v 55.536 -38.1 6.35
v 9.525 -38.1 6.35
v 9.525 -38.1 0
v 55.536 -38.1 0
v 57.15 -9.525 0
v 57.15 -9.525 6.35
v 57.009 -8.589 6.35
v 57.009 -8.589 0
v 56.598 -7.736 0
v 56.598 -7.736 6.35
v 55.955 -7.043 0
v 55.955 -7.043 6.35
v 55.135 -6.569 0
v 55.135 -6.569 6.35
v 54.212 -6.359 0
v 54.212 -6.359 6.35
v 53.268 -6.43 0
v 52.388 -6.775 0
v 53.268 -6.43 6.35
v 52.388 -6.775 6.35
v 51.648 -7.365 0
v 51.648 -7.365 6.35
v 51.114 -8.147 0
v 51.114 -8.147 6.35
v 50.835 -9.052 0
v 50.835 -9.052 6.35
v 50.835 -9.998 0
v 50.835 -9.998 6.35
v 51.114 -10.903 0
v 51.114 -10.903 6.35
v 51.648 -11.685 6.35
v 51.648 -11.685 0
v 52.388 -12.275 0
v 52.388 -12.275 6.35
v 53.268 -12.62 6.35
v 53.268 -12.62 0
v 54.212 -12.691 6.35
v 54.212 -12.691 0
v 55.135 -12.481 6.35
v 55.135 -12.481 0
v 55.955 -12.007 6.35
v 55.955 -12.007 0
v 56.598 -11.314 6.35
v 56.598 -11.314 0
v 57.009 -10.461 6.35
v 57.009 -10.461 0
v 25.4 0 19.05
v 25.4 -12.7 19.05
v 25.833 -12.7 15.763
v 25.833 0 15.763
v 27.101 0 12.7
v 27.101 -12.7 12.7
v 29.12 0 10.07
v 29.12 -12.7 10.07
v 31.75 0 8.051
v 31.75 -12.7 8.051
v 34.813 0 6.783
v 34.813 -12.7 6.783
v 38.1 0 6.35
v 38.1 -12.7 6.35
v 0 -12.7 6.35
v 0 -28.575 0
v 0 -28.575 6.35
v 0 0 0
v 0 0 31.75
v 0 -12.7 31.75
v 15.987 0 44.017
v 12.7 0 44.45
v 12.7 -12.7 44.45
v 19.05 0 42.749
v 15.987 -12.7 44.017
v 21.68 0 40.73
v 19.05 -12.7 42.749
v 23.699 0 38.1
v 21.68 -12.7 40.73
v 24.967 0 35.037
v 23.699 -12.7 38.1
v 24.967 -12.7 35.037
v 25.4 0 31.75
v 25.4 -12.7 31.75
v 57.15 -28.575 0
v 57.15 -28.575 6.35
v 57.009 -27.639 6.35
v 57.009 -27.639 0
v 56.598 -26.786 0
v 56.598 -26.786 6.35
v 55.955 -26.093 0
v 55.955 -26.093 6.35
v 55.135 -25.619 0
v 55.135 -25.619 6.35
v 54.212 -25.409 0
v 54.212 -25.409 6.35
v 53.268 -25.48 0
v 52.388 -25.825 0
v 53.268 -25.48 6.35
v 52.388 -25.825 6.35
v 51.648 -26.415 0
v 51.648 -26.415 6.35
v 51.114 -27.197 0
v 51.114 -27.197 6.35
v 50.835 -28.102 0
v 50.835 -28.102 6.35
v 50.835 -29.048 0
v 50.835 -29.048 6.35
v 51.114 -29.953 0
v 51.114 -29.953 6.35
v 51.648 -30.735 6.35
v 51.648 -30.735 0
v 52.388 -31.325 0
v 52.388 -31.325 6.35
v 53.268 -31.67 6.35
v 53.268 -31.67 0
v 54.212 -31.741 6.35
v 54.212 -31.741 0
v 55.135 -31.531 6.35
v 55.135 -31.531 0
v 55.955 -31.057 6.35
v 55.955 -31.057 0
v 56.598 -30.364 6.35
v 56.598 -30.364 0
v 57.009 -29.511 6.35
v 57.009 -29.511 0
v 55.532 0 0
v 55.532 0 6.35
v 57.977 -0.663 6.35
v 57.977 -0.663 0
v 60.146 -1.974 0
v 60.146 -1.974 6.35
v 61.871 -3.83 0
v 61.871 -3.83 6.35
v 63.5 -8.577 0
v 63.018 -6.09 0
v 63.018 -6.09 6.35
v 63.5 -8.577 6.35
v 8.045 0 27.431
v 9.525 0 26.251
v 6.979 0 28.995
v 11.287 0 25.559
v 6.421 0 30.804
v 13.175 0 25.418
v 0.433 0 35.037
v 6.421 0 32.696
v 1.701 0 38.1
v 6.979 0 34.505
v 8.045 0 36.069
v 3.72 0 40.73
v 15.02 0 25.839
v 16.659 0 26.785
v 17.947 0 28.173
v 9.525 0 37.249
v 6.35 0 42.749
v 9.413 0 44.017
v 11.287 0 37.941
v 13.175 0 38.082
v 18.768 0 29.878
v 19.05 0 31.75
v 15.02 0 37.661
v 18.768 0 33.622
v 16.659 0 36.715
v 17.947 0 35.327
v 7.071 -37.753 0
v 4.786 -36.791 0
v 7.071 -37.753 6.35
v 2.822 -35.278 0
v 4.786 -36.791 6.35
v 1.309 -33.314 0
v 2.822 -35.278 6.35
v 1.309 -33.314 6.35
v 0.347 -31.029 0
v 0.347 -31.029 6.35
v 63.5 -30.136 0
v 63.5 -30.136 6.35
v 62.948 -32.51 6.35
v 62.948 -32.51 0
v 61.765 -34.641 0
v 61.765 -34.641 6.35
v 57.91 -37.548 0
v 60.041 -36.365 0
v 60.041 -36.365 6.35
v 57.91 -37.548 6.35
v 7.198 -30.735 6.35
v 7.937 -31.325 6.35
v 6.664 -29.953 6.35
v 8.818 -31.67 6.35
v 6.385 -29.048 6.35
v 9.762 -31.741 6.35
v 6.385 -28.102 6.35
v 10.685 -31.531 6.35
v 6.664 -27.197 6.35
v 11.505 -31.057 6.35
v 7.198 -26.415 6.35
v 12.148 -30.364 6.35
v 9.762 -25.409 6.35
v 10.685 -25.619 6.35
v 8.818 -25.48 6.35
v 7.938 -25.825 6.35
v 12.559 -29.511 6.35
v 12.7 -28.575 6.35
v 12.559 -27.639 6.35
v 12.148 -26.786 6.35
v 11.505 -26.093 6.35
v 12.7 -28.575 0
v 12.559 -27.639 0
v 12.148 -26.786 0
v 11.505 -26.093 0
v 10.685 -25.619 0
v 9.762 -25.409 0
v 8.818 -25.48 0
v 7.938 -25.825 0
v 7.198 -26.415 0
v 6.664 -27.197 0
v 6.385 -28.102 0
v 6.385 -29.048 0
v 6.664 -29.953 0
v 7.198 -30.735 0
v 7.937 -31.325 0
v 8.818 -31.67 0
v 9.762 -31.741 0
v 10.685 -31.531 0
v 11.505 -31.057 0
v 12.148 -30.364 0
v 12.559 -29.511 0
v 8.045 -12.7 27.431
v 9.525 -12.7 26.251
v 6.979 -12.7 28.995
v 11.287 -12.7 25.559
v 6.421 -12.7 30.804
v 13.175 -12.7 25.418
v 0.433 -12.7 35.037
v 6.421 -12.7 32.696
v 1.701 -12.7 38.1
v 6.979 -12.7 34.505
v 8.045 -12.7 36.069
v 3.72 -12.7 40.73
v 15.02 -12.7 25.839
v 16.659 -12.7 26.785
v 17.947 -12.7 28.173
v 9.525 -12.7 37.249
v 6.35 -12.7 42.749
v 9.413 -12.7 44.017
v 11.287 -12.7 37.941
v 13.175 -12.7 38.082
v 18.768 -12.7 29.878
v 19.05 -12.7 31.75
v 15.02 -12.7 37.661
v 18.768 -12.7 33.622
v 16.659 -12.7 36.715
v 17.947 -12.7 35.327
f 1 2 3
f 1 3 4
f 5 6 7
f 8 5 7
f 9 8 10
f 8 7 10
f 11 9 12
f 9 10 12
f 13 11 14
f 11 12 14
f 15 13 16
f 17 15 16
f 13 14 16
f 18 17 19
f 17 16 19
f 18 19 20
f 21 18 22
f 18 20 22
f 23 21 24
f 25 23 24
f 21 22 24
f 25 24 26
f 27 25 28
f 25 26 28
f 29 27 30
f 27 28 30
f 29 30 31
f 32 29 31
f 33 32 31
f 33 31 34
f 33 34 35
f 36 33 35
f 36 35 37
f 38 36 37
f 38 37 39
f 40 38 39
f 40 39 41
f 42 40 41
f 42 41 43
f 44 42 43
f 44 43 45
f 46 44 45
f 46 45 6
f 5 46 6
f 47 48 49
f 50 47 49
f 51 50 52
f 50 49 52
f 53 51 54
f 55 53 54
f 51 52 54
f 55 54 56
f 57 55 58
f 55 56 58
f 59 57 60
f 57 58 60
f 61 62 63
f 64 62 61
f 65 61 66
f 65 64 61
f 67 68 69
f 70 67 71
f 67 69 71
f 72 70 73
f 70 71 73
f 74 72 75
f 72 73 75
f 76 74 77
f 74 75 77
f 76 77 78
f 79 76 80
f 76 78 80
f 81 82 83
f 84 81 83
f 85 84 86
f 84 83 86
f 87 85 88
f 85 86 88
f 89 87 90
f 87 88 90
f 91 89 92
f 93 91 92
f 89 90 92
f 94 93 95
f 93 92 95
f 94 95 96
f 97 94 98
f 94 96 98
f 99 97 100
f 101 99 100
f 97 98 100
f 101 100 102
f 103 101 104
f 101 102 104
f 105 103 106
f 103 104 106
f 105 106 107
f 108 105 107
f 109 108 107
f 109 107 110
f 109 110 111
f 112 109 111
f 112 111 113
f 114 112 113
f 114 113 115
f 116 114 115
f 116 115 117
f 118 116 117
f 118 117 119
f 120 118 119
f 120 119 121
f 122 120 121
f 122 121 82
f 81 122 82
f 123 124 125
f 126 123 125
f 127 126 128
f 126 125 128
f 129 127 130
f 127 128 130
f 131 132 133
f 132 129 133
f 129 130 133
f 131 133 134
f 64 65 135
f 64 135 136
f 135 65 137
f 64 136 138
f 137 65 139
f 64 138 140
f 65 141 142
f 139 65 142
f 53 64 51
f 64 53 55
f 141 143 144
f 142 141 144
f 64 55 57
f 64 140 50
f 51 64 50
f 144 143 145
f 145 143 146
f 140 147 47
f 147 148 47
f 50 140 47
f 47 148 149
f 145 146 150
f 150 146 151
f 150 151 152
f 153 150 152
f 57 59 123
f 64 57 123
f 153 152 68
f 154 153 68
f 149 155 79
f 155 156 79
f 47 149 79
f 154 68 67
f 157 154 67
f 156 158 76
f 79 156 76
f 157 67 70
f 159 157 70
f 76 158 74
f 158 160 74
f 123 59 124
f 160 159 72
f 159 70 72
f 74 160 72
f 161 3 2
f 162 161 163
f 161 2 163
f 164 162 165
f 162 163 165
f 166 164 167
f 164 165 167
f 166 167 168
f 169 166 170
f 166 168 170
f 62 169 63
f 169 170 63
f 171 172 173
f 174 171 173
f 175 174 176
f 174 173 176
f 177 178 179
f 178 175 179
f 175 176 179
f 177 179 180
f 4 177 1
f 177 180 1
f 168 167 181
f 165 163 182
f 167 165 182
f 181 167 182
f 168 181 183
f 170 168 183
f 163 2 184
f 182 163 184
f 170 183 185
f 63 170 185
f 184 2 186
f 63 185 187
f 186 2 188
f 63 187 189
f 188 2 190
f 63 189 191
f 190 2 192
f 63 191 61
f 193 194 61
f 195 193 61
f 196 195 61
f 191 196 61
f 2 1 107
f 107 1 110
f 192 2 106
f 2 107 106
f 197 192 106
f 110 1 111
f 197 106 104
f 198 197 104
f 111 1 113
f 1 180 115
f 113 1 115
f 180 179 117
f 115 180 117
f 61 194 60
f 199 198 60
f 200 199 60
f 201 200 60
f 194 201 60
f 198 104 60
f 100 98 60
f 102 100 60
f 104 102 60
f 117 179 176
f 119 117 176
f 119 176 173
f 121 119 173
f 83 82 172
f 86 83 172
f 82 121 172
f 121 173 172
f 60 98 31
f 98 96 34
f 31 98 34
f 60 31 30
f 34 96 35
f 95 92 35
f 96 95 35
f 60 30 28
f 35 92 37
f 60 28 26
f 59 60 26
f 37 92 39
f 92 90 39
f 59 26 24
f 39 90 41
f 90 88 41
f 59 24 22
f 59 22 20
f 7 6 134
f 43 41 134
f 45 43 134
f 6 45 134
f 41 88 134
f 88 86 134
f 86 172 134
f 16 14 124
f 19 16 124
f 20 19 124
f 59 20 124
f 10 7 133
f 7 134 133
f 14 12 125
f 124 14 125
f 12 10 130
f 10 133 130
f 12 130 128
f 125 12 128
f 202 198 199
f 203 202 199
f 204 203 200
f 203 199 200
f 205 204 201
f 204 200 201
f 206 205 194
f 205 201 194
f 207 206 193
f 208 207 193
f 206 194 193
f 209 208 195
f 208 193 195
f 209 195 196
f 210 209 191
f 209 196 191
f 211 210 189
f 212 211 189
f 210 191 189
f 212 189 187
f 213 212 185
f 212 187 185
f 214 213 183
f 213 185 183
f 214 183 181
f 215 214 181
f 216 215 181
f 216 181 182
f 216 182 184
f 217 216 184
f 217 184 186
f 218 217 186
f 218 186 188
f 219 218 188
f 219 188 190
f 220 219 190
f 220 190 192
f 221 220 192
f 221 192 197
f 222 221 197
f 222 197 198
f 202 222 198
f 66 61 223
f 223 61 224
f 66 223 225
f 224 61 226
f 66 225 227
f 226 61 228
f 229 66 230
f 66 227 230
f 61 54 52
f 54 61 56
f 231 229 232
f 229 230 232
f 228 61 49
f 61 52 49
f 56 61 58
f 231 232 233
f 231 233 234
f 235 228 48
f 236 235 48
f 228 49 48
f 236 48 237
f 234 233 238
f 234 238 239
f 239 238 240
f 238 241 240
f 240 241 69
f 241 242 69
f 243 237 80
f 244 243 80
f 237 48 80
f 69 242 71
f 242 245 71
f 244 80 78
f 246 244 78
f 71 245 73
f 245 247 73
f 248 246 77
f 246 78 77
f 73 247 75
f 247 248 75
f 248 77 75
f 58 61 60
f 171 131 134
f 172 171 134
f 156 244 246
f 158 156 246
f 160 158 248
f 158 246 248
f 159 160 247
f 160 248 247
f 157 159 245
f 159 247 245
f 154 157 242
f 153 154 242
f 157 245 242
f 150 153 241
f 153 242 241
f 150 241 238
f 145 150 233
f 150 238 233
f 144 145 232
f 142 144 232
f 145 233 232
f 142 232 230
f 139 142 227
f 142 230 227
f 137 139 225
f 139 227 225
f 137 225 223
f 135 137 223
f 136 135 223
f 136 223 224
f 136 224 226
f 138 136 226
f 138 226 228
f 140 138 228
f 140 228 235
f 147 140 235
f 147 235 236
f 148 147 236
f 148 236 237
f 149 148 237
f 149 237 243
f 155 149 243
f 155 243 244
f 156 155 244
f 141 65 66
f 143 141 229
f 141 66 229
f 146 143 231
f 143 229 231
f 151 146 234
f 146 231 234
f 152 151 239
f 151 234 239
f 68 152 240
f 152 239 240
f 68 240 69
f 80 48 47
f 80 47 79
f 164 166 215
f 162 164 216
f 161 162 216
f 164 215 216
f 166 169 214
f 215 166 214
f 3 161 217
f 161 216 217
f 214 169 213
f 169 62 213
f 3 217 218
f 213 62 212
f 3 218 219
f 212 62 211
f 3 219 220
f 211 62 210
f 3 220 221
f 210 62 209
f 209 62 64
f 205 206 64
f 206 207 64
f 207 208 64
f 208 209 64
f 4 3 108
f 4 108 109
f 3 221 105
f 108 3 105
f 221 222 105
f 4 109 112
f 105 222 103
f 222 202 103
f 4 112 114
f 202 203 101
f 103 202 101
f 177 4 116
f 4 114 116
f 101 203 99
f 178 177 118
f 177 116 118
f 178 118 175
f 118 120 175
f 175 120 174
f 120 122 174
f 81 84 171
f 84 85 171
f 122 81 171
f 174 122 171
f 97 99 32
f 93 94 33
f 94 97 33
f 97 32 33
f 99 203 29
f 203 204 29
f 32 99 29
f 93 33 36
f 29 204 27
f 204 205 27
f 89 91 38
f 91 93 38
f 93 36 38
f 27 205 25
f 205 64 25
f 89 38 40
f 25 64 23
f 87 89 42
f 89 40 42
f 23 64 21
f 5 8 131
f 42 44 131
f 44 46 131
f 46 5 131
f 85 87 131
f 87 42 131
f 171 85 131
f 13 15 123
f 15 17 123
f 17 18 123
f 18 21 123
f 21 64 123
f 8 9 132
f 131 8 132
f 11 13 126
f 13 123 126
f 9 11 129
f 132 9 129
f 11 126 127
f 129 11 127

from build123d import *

# Parameters (mm, degrees)
F0_W      = 63.5
F0_H      = 44.45
F1_DEPTH  = 38.1
F2_W      = 25.4
F2_H      = 38.1
F3_DEPTH  = 38.101
F5_W      = 25.4
F5_H      = 38.1
F6_DEPTH  = 38.101
F4_W      = 12.7
F4_H      = 25.4
F7_DEPTH  = 38.101
F8_R      = 6.35
F9_DEPTH  = 12.701
F10_R     = 3.175
F11_DEPTH = 6.351


# Not quite as in the source:
# - a feature names something its author has since deleted; it is built from what else it names


with BuildPart() as f1:
    # F0 (on Front) → F1 (new body)
    with BuildSketch(Plane.XZ):
        with Locations((31.75, 22.225)):
            Rectangle(F0_W, F0_H)
    extrude(amount=F1_DEPTH)

    # F2 (on face) → F3 (cut, through all)
    with BuildSketch(Plane.XZ.offset(38.1)):
        with Locations((50.8, 25.4)):
            Rectangle(F2_W, F2_H)
    extrude(amount=-F3_DEPTH, mode=Mode.SUBTRACT)

    # F5 (on face) → F6 (cut, through all)
    with BuildSketch(Plane.YZ.offset(38.1)):
        with Locations((-25.4, 25.4)):
            Rectangle(F5_W, F5_H)
    extrude(amount=-F6_DEPTH, mode=Mode.SUBTRACT)

    # F4 (on face) → F7 (cut, through all)
    with BuildSketch(Plane.XZ.offset(38.1)):
        with Locations((31.75, 31.75)):
            Rectangle(F4_W, F4_H)
        with BuildLine():
            Line((38.1, 19.05), (25.4, 19.05))
            ThreePointArc((25.4, 19.05), (29.1197438789, 10.0697438789), (38.1, 6.35))
            Line((38.1, 6.35), (38.1, 19.05))
        make_face()
    extrude(amount=-F7_DEPTH, mode=Mode.SUBTRACT)

    # F8 (on face) → F9 (cut, through all)
    with BuildSketch(Plane.XZ.offset(12.7)):
        with Locations((12.7, 31.75)):
            Circle(F8_R)
        with BuildLine():
            ThreePointArc((12.6999999213, 44.45), (21.6802560932, 40.7302561489), (25.4, 31.75))
            Line((25.4, 31.75), (25.4, 44.45))
            Line((25.4, 44.45), (12.6999999213, 44.45))
        make_face()
        with BuildLine():
            ThreePointArc((0, 31.75), (3.7197438511, 40.7302560932), (12.6999999213, 44.45))
            Line((12.6999999213, 44.45), (0, 44.45))
            Line((0, 44.45), (0, 31.75))
        make_face()
    extrude(amount=-F9_DEPTH, mode=Mode.SUBTRACT)

    # F10 (on face) → F11 (cut, through all)
    with BuildSketch(Plane.XY.offset(6.35)):
        with BuildLine():
            Line((63.5, 0), (55.5319362459, 0))
            ThreePointArc((55.5319362459, 0), (61.0732443905, -2.8419244619), (63.5, -8.5772089198))
            Line((63.5, -8.5772089198), (63.5, 0))
        make_face()
        with BuildLine():
            ThreePointArc((63.5, -30.1359133542), (60.963360935, -35.563360935), (55.5359133542, -38.1))
            Line((55.5359133542, -38.1), (63.5, -38.1))
            Line((63.5, -38.1), (63.5, -30.1359133542))
        make_face()
        with BuildLine():
            ThreePointArc((9.525, -38.1), (2.8223237752, -35.2776762248), (0, -28.575))
            Line((0, -28.575), (0, -38.1))
            Line((0, -38.1), (9.525, -38.1))
        make_face()
        with Locations((9.525, -28.575)):
            Circle(F10_R)
        with Locations((53.975, -28.575)):
            Circle(F10_R)
        with Locations((53.975, -9.525)):
            Circle(F10_R)
    extrude(amount=-F11_DEPTH, mode=Mode.SUBTRACT)


solid = f1.part
